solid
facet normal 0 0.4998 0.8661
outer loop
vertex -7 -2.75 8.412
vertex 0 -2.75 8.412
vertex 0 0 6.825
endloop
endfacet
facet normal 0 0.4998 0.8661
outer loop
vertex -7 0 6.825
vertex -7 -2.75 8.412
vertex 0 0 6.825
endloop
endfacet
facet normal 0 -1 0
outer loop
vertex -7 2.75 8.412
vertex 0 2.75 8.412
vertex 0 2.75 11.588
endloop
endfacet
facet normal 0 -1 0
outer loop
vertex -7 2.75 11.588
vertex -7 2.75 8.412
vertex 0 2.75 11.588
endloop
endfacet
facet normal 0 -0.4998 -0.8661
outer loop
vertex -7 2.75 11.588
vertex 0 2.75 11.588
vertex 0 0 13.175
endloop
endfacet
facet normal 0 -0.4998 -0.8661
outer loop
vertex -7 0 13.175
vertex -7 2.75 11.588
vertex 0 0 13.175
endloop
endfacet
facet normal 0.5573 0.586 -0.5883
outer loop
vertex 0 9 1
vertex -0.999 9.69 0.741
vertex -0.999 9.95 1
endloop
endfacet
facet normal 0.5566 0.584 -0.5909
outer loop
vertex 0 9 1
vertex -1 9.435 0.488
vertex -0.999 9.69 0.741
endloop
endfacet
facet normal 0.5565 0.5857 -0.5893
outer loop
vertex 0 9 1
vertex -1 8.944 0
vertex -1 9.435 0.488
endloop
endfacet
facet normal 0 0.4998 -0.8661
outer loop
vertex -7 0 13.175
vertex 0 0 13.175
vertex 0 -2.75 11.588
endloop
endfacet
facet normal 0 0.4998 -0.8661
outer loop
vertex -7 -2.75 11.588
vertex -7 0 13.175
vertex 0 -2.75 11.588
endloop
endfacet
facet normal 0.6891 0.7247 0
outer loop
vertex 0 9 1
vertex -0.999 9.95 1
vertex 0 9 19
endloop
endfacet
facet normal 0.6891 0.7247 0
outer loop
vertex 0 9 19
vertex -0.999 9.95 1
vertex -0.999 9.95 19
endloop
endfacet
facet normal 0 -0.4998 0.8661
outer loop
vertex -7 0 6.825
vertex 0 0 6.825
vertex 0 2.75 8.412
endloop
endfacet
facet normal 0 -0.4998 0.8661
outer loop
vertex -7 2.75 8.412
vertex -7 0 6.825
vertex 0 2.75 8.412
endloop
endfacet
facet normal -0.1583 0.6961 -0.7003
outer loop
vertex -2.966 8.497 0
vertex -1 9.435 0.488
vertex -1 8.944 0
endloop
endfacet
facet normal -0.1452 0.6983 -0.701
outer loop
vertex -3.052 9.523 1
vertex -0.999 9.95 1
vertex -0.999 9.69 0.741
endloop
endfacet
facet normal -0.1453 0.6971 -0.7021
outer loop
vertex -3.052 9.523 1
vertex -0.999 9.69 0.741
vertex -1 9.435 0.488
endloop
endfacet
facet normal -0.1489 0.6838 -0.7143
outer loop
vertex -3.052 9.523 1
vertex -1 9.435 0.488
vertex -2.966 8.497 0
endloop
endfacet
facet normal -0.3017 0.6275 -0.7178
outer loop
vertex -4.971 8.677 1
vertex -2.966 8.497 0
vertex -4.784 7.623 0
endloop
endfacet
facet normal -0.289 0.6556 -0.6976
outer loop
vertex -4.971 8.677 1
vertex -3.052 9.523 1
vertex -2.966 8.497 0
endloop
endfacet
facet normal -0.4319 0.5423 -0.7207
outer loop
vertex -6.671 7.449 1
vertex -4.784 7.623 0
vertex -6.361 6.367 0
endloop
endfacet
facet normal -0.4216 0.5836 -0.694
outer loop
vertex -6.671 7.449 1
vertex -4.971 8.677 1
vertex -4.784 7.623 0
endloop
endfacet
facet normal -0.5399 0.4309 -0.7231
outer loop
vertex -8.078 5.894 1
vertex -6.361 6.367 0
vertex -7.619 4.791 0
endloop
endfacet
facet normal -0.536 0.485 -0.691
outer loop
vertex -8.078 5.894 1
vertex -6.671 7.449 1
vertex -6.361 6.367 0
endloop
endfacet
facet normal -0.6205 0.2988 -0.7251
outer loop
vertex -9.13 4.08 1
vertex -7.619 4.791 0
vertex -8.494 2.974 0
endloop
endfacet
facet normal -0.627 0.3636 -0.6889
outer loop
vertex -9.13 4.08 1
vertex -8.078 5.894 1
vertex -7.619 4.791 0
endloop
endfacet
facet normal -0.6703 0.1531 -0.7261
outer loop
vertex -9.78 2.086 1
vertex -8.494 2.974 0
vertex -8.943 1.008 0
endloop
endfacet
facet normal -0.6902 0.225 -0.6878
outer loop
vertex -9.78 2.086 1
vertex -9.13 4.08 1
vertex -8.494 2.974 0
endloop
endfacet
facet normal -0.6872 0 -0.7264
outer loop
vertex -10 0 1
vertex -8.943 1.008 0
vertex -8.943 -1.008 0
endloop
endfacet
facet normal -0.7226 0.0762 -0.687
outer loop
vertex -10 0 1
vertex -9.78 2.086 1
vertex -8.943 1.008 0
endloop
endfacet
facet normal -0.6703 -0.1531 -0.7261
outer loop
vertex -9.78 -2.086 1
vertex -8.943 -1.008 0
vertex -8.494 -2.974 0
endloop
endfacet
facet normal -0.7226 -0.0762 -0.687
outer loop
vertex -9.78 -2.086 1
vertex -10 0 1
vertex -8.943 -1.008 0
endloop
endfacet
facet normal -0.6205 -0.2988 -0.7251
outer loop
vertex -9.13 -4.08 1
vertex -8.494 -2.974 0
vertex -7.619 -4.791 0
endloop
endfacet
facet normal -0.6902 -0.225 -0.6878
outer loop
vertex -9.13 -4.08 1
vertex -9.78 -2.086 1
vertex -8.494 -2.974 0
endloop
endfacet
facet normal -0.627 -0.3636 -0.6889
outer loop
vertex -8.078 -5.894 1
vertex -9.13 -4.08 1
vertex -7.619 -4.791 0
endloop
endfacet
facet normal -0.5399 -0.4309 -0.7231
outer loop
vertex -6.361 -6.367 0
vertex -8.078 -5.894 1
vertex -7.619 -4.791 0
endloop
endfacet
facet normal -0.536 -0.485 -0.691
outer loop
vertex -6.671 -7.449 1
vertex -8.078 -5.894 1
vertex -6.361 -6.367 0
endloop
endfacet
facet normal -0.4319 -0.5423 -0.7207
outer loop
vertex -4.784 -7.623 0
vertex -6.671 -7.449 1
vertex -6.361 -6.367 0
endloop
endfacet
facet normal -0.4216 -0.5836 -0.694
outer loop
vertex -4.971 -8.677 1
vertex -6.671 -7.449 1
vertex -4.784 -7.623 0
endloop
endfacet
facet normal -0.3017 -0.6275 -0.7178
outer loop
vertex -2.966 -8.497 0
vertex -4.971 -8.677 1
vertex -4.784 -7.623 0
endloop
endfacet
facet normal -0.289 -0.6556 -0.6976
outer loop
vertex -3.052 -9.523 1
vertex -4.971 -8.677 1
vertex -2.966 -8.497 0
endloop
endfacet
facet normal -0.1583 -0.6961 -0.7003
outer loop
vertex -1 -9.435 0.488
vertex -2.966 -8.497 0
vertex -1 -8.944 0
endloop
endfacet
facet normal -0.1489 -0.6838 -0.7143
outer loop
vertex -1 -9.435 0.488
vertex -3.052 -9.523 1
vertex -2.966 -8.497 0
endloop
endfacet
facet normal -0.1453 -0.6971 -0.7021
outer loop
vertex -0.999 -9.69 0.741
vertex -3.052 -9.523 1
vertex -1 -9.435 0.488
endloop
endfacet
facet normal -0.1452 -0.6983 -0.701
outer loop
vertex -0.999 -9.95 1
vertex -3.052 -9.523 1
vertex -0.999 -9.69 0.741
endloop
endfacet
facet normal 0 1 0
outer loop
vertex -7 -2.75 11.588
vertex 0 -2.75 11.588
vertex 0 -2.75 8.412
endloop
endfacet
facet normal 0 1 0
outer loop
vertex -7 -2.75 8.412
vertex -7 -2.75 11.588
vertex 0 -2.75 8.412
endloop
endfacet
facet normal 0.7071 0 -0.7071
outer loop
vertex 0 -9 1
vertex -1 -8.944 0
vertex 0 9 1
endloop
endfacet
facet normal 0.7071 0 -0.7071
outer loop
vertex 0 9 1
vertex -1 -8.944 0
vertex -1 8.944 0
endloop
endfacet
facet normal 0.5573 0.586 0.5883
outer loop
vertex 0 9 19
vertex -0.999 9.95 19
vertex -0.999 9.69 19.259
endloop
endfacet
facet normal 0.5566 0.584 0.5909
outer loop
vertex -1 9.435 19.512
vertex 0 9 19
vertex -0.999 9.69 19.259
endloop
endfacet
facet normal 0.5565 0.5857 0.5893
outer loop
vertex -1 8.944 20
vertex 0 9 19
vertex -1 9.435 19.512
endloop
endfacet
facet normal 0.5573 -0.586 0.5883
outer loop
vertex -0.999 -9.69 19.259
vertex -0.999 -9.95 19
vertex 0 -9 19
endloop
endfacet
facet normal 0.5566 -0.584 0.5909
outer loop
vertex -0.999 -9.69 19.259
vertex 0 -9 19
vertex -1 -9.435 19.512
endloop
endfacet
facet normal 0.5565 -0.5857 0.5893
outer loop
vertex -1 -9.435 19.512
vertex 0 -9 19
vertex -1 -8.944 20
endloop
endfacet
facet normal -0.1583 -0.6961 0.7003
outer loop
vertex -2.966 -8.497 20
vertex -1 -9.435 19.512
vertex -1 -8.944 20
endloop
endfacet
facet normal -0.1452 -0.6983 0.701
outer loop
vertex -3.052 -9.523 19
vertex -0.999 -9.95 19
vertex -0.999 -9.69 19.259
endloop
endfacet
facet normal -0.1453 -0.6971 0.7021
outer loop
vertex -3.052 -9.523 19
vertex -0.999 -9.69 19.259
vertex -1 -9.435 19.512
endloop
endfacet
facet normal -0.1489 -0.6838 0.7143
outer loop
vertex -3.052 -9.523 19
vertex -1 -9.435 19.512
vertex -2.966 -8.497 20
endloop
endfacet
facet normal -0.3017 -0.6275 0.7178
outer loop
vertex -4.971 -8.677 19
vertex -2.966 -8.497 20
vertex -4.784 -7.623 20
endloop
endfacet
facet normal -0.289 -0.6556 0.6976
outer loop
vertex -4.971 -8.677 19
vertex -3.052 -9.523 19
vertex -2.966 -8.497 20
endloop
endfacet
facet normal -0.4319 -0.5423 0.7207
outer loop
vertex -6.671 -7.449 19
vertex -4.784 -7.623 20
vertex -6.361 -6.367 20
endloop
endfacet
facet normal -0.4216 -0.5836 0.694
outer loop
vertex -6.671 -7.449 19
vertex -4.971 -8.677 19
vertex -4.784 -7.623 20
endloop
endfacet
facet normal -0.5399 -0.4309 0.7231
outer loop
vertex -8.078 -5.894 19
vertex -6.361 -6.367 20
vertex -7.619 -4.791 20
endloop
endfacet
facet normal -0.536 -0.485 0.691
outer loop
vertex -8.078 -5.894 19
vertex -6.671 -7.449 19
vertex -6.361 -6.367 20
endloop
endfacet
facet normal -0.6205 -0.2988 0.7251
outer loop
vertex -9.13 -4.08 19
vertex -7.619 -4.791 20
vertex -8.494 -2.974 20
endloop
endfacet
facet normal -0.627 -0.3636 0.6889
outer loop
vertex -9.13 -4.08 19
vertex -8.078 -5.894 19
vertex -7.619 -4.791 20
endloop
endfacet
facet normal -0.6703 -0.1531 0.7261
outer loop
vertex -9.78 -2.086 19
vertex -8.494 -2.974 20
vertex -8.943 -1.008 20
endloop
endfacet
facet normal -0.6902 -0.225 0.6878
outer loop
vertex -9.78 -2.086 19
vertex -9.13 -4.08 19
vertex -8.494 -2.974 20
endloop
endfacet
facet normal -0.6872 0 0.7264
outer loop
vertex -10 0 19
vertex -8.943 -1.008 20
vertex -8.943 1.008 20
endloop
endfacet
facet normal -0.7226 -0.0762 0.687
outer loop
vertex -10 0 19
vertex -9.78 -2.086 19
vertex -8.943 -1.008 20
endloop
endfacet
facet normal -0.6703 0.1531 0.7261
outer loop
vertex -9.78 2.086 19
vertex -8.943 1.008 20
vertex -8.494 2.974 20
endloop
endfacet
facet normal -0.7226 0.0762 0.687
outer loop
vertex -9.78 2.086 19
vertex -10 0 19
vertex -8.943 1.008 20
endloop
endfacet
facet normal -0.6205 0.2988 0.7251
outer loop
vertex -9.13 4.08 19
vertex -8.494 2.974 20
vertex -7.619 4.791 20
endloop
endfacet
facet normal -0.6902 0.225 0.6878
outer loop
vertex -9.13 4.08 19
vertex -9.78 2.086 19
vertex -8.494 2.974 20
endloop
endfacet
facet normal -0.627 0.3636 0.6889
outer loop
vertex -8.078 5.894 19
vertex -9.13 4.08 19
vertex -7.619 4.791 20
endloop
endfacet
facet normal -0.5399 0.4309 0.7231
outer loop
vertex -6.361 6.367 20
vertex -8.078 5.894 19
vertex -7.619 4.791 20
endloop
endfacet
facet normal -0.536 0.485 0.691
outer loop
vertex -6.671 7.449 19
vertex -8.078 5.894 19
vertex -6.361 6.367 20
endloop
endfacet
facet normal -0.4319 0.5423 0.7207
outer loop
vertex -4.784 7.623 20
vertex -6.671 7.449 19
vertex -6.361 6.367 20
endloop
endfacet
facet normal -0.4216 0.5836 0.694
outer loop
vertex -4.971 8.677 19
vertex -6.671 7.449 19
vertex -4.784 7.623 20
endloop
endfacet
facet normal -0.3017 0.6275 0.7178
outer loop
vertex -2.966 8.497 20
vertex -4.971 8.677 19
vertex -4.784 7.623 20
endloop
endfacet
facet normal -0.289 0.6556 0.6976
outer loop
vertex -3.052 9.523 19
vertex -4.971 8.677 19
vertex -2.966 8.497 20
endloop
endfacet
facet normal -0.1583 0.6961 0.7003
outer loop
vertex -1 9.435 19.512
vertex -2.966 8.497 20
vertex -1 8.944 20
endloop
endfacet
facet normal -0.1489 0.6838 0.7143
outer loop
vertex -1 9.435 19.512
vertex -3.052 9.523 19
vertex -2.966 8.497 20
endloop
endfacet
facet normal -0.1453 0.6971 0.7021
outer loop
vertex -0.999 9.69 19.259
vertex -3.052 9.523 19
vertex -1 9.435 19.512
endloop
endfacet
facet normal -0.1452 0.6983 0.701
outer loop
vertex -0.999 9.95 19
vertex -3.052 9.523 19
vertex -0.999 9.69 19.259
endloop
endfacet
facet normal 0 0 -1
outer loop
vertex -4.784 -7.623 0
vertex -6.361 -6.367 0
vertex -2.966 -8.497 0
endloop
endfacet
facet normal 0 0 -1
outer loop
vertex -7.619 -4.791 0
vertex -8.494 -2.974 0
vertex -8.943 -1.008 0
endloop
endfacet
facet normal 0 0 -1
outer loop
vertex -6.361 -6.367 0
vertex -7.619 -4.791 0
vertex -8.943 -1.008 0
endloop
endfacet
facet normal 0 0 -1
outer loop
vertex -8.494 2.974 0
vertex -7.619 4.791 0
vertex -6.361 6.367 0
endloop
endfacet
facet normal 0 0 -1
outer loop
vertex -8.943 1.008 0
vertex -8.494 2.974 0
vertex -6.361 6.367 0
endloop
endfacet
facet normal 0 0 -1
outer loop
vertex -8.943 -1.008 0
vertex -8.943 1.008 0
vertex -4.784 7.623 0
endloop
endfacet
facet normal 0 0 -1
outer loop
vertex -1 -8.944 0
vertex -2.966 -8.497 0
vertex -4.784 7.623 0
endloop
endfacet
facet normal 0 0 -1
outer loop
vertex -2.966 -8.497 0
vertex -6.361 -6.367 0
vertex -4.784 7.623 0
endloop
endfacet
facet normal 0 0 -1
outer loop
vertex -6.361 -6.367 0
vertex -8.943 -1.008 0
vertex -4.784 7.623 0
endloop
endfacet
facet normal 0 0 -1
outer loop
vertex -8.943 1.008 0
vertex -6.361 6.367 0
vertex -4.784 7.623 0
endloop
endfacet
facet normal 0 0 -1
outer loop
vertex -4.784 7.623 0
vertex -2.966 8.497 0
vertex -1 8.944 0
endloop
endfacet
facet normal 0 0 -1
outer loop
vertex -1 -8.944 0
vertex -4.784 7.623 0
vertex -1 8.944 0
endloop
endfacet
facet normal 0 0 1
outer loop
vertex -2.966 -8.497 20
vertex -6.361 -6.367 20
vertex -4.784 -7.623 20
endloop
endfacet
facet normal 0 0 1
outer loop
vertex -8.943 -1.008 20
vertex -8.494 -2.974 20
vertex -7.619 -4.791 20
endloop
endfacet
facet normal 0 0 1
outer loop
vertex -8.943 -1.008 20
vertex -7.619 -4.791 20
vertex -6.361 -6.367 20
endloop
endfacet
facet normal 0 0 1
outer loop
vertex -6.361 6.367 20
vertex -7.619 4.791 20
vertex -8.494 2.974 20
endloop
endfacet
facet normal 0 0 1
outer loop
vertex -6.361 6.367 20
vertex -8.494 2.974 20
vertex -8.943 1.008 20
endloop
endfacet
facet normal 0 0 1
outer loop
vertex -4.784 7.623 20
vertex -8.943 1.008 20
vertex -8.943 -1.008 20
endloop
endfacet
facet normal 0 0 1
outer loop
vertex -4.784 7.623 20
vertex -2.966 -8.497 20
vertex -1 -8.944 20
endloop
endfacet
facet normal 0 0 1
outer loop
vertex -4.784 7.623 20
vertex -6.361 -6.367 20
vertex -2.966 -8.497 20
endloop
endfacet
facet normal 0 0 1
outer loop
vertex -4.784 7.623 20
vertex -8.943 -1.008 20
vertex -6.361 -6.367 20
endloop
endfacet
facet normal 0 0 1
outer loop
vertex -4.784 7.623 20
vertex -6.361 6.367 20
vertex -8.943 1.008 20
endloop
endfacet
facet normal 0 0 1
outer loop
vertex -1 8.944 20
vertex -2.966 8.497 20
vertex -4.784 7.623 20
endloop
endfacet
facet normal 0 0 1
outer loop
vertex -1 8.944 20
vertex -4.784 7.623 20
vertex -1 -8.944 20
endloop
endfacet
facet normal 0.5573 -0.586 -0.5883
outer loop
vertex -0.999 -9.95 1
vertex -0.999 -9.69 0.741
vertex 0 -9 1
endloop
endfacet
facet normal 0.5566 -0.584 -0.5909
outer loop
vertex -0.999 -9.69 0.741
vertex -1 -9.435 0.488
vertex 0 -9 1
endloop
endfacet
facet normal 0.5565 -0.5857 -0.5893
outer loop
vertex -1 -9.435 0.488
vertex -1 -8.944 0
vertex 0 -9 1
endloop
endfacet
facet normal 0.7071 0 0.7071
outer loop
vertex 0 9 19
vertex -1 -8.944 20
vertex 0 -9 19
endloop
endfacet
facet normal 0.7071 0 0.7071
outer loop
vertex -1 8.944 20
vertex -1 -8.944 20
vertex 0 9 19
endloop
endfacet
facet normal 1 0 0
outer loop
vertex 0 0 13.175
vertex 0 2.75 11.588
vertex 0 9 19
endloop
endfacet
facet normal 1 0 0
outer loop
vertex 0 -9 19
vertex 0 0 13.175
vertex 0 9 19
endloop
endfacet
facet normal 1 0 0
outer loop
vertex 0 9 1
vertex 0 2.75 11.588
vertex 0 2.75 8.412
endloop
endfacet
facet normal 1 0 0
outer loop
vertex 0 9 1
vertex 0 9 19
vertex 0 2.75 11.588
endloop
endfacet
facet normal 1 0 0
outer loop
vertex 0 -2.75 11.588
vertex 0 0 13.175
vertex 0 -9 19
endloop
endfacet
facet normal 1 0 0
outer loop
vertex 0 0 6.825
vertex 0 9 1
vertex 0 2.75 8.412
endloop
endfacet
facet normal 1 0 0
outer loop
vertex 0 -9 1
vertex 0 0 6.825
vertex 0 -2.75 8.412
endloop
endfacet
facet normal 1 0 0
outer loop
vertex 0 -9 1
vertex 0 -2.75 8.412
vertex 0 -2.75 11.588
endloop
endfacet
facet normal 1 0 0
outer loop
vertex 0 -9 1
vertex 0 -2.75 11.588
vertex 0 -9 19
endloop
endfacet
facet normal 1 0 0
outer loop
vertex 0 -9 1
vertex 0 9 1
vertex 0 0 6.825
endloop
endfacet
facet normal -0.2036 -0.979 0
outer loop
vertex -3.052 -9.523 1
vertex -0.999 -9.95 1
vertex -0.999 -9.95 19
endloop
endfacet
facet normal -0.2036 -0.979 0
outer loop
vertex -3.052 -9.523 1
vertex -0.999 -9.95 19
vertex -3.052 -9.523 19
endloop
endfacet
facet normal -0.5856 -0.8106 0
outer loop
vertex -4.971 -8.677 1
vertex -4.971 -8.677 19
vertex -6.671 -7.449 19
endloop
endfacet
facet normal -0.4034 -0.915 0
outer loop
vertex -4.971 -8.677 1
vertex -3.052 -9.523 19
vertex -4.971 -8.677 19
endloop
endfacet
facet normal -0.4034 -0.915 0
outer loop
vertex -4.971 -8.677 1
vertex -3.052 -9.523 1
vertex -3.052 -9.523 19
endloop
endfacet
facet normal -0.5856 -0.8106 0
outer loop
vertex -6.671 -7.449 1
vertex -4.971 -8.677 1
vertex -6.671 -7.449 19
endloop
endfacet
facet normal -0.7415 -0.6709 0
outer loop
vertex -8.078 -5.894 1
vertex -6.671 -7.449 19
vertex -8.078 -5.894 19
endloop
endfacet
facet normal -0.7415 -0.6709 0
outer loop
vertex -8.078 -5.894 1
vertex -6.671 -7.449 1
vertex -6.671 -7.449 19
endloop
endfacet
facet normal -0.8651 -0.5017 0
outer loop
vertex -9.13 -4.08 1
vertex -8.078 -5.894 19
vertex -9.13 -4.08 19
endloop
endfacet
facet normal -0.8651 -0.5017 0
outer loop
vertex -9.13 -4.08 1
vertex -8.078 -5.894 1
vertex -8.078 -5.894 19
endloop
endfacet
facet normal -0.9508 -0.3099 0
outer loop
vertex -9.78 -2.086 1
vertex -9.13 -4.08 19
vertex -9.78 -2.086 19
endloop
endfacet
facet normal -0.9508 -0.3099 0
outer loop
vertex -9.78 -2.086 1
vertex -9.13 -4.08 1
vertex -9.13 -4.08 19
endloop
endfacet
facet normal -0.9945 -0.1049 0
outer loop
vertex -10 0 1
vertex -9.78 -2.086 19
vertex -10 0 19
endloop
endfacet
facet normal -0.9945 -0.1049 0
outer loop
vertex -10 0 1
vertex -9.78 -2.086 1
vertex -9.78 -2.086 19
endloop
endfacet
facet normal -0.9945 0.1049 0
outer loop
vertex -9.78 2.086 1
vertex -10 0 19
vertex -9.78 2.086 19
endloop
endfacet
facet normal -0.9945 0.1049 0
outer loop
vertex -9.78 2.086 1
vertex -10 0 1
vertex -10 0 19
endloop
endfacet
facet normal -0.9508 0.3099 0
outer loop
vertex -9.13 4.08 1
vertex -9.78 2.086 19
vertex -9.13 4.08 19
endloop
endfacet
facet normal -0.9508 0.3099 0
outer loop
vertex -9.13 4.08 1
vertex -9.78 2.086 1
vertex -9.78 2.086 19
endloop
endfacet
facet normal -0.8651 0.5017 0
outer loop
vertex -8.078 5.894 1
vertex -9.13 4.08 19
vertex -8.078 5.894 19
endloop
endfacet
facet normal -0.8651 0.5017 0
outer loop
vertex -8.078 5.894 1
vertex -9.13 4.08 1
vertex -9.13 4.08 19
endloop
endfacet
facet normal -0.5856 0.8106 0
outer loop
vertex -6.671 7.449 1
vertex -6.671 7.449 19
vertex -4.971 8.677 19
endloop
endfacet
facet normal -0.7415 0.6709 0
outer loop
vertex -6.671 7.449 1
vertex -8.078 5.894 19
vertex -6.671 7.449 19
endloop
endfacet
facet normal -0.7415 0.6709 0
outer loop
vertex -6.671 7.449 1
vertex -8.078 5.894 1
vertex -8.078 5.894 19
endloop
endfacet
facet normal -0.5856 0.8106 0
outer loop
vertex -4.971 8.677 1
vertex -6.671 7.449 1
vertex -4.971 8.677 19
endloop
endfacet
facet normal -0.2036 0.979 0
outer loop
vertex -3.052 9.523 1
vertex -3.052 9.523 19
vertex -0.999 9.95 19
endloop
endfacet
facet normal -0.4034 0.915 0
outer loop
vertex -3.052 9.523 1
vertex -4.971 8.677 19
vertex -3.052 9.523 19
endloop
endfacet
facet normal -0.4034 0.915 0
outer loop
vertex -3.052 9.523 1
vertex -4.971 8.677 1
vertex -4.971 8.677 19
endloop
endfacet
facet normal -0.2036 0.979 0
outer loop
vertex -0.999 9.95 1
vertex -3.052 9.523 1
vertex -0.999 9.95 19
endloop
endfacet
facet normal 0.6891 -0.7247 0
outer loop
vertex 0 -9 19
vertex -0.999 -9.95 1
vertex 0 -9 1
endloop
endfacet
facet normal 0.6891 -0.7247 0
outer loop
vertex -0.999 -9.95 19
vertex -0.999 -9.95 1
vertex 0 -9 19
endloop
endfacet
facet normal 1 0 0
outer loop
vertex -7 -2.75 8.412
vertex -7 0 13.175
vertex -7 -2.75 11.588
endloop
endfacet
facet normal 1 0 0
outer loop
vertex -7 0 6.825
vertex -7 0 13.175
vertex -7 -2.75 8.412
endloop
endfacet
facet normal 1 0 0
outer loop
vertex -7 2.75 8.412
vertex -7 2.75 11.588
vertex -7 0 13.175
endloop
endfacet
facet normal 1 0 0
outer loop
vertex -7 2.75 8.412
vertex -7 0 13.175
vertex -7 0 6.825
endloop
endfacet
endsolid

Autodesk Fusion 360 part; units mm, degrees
sketch "Sketch1" plane through (0, 0, 0) normal (0, 0, 1) x (1, 0, 0)
  line L0 (0, 10) -> (0, -10)
  arc A0 (0, 10) -> (0, -10) centre (0, 0) ccw
extrude "Extrude1" add sketch "Sketch1" along normal blind 20
sketch "Sketch2" plane through (0, 0, 0) normal (1, 0, 0) x (0, 0, -1)
  line L0 (0, -10) -> (0, 10)
  line L1 (0, 10) -> (-20, 10)
  line L2 (-20, 10) -> (-20, -10)
  line L3 (-20, -10) -> (0, -10)
  line L4 (-8.4123, -2.75) -> (-6.8246, 0)
  line L5 (-6.8246, 0) -> (-8.4123, 2.75)
  line L6 (-8.4123, 2.75) -> (-11.5877, 2.75)
  line L7 (-11.5877, 2.75) -> (-13.1754, 0)
  line L8 (-13.1754, 0) -> (-11.5877, -2.75)
  line L9 (-11.5877, -2.75) -> (-8.4123, -2.75)
  point P0 (-10, 0)
  dimension "d3" = 2.75
extrude "Extrude2" cut sketch "Sketch2" against normal blind 7 contours L4 L5 L6 L7 L8 L9
chamfer "Chamfer1" distance 1 angle 45 6 edges at (0, 0, 20) (0, 10, 10) (0, -10, 10) (0, 0, 0) (-10, 0, 0) (-10, 0, 20)
equation "d3 = ( 5.5 / 2 ) * 1 mm"
